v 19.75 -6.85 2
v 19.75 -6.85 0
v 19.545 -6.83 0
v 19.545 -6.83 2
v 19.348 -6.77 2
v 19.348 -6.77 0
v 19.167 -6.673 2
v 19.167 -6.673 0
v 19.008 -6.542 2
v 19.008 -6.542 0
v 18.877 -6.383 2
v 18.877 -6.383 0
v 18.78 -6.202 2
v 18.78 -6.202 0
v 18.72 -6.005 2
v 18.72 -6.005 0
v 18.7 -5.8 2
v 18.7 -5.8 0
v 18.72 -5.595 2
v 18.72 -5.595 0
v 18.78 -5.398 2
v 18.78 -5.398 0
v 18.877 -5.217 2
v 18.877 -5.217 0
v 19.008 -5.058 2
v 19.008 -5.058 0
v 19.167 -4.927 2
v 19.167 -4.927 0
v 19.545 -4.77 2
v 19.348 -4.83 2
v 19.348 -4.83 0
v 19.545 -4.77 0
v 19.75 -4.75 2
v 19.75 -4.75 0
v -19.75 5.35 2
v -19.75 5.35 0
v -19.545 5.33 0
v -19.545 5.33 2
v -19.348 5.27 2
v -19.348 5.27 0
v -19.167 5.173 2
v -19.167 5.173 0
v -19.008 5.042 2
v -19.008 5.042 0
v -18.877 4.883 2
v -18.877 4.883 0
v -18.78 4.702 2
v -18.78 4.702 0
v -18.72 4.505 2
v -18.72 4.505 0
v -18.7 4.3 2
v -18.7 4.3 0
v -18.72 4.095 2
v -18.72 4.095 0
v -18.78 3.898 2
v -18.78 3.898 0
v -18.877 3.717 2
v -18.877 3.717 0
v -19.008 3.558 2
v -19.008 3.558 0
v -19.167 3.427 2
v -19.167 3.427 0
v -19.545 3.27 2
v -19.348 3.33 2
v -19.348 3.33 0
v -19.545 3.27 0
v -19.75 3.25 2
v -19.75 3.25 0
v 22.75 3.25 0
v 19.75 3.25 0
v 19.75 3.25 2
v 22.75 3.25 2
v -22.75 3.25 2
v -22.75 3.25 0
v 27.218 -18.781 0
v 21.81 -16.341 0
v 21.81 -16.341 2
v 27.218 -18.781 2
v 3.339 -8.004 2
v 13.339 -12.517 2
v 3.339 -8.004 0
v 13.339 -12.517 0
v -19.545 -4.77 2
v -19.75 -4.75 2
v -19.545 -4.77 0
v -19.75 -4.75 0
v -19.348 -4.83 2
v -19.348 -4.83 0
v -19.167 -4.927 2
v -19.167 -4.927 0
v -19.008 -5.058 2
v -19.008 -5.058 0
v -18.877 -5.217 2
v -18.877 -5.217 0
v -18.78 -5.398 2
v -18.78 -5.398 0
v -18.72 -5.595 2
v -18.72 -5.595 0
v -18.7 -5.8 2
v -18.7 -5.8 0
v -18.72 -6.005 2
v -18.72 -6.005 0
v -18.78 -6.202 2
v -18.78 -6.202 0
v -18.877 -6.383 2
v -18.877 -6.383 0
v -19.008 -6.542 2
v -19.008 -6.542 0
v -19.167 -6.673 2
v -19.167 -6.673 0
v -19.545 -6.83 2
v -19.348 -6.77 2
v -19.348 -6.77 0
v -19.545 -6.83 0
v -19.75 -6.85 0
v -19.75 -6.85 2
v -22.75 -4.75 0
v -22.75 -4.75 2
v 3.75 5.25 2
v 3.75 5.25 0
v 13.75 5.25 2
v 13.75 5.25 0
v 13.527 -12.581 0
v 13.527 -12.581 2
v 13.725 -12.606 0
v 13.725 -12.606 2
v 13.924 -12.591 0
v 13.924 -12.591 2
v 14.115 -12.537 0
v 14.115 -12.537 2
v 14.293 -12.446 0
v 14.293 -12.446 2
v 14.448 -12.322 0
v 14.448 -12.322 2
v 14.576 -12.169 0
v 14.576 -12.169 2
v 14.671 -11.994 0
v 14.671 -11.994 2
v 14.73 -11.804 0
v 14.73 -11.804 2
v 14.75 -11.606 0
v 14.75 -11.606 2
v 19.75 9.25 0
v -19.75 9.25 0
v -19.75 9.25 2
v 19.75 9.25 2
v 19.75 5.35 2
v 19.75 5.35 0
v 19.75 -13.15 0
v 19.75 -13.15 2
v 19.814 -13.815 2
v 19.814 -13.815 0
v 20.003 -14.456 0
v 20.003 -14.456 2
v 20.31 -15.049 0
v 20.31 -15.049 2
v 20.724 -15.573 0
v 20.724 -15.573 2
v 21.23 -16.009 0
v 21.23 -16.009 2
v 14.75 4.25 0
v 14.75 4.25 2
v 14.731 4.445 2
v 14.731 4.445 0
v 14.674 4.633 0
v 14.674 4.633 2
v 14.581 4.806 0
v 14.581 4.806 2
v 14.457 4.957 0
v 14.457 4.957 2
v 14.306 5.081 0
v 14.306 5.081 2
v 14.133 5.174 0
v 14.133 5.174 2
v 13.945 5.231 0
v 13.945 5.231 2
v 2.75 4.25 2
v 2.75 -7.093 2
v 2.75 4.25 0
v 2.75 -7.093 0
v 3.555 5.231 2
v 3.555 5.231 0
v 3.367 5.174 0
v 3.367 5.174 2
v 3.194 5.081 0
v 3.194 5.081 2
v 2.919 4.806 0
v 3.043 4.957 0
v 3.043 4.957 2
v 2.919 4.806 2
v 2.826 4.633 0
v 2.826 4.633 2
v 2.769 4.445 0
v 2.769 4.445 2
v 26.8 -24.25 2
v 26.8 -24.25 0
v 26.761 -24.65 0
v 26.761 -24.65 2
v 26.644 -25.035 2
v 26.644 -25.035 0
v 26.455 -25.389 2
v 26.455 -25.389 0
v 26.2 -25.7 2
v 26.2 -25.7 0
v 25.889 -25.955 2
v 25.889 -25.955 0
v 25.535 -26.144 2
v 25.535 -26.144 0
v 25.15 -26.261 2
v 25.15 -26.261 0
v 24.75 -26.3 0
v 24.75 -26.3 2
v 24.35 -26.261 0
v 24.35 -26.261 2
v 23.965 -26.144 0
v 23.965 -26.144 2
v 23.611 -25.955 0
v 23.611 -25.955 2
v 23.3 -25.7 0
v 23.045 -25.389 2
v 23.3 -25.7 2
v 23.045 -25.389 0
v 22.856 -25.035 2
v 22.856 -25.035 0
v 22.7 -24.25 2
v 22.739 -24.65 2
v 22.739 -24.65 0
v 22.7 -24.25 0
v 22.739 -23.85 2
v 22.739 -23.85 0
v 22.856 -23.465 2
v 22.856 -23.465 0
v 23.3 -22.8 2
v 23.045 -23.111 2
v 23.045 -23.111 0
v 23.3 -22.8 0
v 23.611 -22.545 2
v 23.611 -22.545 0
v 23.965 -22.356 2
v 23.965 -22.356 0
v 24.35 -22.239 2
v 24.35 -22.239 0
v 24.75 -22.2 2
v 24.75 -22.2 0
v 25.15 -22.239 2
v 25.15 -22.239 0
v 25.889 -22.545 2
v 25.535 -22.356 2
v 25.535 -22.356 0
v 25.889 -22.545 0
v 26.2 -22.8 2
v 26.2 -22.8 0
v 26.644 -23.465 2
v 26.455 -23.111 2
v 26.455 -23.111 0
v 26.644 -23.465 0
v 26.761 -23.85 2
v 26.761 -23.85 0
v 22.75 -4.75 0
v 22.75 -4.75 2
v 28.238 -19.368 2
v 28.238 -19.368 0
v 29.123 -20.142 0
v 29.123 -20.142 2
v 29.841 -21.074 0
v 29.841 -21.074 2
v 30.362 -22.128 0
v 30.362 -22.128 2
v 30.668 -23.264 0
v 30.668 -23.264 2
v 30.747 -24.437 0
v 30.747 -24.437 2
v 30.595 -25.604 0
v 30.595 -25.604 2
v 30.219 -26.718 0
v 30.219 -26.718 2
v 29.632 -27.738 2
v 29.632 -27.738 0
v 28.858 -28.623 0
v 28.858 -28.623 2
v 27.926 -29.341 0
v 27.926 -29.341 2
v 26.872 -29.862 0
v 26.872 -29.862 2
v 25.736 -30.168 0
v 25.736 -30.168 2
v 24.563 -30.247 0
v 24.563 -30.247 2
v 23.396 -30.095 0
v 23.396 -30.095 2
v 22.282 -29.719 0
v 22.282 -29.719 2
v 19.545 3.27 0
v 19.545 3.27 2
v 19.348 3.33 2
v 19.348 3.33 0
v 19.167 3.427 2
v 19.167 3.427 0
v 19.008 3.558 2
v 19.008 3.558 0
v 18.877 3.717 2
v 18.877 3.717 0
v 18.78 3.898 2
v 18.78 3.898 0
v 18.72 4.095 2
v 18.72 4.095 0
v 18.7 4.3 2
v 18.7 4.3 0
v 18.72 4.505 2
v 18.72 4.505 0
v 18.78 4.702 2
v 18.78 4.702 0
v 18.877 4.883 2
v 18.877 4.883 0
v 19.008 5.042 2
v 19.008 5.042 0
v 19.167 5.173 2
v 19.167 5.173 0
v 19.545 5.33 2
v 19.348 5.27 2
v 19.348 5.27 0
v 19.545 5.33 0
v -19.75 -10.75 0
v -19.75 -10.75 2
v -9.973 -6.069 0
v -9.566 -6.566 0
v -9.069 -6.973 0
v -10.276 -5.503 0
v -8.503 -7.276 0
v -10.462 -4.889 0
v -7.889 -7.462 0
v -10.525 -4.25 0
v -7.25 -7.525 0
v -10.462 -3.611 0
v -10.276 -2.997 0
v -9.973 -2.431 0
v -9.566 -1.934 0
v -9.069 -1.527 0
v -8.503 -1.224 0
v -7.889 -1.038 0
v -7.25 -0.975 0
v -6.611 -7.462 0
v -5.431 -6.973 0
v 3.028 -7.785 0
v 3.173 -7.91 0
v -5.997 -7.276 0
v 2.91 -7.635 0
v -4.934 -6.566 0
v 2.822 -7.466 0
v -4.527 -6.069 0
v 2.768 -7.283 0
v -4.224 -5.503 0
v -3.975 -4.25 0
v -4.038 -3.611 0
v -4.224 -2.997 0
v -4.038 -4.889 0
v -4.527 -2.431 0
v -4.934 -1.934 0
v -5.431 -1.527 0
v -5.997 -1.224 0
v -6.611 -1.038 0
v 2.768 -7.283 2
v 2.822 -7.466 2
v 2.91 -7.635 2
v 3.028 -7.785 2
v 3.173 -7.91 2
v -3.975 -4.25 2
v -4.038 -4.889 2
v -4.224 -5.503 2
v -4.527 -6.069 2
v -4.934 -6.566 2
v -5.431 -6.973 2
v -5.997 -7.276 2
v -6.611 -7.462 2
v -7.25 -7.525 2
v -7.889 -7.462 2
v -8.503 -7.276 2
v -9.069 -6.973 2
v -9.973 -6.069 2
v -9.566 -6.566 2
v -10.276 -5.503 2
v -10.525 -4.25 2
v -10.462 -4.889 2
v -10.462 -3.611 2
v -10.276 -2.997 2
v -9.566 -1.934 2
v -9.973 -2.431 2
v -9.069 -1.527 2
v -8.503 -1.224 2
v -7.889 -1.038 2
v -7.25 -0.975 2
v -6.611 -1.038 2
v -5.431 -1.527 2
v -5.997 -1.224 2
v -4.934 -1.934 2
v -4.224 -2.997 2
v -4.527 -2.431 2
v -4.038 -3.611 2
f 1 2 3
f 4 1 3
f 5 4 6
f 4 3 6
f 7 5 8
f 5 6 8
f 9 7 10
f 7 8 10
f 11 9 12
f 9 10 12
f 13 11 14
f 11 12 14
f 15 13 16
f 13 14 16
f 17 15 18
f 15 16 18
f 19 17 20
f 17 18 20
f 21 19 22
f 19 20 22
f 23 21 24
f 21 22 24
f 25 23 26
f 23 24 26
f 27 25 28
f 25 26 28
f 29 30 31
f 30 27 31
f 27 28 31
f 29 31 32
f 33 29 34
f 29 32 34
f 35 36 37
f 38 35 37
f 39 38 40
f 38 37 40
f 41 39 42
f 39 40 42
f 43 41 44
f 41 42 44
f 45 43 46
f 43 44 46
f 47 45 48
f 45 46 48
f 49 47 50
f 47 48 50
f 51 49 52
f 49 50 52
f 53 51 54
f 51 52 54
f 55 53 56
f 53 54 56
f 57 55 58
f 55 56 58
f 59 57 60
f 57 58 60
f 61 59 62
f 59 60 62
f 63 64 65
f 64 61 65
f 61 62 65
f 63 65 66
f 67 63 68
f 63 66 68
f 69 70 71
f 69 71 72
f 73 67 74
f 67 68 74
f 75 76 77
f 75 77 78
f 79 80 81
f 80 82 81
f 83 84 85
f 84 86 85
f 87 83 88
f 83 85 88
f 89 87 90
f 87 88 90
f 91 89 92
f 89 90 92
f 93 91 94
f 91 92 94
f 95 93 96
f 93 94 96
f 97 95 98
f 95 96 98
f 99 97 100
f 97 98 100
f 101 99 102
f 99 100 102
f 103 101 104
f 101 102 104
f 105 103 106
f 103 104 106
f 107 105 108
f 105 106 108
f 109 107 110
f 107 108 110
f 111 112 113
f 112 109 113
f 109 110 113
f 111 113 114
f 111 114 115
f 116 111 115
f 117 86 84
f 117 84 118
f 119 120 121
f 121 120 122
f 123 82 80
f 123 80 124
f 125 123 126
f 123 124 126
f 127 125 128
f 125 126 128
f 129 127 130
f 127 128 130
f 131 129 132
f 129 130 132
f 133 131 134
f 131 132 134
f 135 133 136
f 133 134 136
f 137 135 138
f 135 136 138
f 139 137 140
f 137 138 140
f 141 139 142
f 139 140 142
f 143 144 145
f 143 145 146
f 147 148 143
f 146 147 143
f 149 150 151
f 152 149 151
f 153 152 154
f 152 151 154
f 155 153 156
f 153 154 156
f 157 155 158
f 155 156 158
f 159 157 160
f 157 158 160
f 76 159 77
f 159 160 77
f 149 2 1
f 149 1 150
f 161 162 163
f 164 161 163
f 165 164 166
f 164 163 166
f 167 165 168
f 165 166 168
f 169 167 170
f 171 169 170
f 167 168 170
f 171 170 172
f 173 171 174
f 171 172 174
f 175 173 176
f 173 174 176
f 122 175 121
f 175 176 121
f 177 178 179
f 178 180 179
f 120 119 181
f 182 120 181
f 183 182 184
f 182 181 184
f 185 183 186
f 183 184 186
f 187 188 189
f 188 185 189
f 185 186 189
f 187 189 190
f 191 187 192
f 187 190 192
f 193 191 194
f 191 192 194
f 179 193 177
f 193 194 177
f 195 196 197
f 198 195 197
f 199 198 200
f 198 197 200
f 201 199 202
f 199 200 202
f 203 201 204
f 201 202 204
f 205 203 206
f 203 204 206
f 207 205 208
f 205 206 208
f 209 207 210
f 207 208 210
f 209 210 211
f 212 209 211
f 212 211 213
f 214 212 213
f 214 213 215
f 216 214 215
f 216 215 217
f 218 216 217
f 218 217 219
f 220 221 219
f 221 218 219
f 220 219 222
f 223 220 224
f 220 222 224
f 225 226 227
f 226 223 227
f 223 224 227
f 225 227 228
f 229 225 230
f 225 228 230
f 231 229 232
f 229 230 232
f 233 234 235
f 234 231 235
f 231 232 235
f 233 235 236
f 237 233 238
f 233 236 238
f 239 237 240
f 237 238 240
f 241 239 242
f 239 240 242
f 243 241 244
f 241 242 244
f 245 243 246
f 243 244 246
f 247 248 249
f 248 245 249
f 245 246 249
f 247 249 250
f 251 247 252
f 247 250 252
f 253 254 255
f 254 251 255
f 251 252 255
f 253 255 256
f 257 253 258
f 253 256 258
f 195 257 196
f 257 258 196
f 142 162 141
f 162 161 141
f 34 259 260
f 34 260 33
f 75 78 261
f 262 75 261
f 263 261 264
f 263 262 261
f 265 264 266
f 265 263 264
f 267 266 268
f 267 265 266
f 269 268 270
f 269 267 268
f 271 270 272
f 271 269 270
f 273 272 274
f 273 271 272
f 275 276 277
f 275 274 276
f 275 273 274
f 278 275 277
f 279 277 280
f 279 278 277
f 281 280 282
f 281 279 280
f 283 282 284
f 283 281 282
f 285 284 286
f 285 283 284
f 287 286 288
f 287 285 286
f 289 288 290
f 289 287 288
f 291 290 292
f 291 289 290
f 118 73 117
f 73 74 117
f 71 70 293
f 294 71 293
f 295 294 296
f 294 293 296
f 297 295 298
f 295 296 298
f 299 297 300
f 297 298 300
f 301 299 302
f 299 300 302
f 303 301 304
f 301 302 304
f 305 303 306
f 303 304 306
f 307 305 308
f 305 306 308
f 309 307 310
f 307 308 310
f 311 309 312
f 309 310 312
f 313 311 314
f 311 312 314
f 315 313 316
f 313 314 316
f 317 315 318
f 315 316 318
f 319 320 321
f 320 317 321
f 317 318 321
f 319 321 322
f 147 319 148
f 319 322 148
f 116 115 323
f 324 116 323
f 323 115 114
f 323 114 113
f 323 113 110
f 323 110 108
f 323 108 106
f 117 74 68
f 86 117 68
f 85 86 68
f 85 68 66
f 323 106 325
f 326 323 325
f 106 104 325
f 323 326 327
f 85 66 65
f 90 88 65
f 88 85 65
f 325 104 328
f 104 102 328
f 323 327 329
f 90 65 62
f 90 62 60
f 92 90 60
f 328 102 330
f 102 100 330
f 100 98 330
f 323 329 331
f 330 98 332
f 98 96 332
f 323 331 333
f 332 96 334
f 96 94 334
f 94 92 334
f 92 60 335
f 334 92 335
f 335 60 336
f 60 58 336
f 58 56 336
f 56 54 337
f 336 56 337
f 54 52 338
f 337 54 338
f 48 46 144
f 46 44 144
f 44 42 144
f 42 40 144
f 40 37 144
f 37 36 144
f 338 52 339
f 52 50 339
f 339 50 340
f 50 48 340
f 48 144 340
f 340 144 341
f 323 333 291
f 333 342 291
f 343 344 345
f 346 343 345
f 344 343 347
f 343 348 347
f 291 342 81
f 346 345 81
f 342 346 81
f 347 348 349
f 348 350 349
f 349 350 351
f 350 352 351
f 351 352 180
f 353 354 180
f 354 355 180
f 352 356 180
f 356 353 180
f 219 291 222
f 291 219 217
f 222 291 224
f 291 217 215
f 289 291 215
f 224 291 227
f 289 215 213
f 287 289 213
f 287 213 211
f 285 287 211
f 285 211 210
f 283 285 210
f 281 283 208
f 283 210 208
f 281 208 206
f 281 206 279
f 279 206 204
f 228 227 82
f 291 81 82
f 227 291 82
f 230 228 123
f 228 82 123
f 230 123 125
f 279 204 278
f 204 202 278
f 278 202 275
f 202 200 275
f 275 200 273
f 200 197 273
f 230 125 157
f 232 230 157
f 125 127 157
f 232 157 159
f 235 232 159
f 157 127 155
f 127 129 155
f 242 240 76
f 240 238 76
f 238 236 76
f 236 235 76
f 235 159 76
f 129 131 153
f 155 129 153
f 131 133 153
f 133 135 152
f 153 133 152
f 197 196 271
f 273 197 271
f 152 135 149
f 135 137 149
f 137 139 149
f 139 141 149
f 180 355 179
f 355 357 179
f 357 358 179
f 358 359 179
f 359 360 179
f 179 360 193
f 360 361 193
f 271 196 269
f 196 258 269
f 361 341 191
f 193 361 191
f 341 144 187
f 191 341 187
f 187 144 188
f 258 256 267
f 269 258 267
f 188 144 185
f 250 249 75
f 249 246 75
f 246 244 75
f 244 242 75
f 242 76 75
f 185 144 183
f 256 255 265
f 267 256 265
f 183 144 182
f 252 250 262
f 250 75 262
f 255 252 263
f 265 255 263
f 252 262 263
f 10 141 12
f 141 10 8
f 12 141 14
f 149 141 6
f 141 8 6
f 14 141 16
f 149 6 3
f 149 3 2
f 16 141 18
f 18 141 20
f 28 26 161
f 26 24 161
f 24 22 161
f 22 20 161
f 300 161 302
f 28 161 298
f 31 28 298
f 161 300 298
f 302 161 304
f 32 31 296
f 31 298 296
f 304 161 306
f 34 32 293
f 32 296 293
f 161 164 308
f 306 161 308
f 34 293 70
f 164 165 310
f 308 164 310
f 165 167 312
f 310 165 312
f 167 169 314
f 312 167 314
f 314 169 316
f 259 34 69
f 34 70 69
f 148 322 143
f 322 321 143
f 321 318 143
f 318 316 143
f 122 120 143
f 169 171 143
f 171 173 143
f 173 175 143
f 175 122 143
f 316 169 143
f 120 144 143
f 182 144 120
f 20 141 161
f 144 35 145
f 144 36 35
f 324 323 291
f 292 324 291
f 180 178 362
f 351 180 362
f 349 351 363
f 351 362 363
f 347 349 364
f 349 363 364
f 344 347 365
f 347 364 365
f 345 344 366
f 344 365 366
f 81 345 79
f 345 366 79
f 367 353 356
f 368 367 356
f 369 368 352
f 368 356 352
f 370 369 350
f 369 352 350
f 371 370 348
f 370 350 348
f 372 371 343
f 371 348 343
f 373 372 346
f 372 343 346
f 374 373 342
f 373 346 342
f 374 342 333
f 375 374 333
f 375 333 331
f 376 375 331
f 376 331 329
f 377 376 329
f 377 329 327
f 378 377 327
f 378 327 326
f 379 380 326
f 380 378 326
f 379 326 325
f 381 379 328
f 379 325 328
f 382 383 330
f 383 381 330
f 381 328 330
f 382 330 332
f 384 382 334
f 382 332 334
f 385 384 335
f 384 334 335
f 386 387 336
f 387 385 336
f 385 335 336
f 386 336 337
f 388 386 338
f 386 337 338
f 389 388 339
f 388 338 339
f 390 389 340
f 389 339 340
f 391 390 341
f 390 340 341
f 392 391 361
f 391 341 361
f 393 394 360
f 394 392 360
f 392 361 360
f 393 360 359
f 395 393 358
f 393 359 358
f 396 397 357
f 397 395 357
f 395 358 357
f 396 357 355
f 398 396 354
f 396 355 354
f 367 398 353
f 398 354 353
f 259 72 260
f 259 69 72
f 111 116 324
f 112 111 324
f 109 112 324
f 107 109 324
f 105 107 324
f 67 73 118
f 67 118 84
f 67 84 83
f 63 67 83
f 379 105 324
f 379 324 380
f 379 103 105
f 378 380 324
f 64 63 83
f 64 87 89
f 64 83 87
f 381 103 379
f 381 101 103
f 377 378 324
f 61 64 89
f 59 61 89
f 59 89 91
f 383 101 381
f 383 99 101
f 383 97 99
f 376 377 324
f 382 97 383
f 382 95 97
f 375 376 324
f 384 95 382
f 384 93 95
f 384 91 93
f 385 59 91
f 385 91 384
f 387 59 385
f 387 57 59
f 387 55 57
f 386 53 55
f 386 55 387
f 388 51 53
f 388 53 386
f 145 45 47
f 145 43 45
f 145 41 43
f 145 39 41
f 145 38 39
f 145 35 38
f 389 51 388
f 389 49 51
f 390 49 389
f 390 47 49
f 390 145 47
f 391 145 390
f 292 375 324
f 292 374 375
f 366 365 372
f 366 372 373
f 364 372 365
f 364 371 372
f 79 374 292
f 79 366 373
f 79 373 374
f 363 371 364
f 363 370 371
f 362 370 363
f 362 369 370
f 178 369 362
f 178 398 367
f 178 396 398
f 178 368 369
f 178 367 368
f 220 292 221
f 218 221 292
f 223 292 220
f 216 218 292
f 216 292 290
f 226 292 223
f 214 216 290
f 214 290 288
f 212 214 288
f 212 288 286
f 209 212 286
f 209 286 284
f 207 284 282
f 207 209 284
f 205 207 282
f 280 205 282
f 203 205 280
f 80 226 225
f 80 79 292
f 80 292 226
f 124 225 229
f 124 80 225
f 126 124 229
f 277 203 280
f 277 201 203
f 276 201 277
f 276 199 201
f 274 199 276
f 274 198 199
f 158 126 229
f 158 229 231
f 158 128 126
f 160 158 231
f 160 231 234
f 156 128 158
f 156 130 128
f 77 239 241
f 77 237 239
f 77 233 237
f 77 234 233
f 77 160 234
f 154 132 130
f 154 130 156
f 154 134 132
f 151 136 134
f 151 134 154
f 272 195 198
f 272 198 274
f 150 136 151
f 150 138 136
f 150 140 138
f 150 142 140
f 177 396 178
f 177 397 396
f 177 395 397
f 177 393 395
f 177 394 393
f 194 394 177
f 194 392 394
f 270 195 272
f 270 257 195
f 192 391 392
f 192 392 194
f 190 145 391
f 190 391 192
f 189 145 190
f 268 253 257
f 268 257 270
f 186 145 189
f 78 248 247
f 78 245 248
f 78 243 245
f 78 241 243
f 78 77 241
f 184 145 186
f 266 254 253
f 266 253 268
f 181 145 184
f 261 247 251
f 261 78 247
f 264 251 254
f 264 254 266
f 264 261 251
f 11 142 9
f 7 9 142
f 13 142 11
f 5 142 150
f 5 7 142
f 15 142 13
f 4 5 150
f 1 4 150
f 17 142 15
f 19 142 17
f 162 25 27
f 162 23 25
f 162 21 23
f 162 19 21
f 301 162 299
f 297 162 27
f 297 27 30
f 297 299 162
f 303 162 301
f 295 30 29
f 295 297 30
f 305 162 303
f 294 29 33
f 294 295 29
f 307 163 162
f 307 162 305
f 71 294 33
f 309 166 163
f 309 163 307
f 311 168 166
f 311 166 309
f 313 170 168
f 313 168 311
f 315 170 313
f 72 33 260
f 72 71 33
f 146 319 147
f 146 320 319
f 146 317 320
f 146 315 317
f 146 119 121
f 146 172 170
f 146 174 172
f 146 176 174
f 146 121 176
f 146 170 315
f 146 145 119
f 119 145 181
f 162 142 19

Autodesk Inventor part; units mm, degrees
ref_plane "YZ Plane" through (0, 0, 0) normal (1, 0, 0) x (0, 1, 0)
ref_plane "XZ Plane" through (0, 0, 0) normal (0, 1, 0) x (-1, 0, 0)
ref_plane "XY Plane" through (0, 0, 0) normal (0, 0, 1) x (1, 0, 0)
sketch "スケッチ1" plane through (0, 0, 0) normal (0, 0, 1) x (1, 0, 0)
  line L0 (-19.75, 25.75) -> (19.75, 25.75) construction
  line L1 (19.75, 25.75) -> (19.75, -25.75) construction
  line L2 (19.75, -25.75) -> (-19.75, -25.75) construction
  line L3 (-19.75, -25.75) -> (-19.75, 25.75) construction
  line L4 (-19.75, 25.75) -> (19.75, -25.75) construction
  line L5 (19.75, 25.75) -> (-19.75, -25.75) construction
  circle A0 centre (24.75, -24.25) radius 2.05
  circle A1 centre (-7.25, -4.25) radius 3.275
  line L6 (0, 25.75) -> (0, -25.75) construction
  line L7 (-19.75, 3.25) -> (-22.75, 3.25)
  line L8 (-22.75, 3.25) -> (-22.75, -4.75)
  arc A2 (-19.75, 3.25) -> (-19.75, 5.35) centre (-19.75, 4.3) ccw
  line L9 (-22.75, -0.75) -> (-19.75, -0.75) construction
  line L10 (-19.75, -4.75) -> (-22.75, -4.75)
  arc A3 (-19.75, -6.85) -> (-19.75, -4.75) centre (-19.75, -5.8) ccw
  line L11 (-19.75, 5.35) -> (-19.75, 9.25)
  line L12 (-19.75, 9.25) -> (19.75, 9.25)
  arc A4 (19.75, 5.35) -> (19.75, 3.25) centre (19.75, 4.3) ccw
  arc A5 (19.75, -4.75) -> (19.75, -6.85) centre (19.75, -5.8) ccw
  line L13 (19.75, 5.35) -> (19.75, 9.25)
  arc A6 (22.2819, -29.7189) -> (27.2181, -18.7811) centre (24.75, -24.25) ccw
  line L14 (-19.75, -6.85) -> (-19.75, -10.75)
  line L15 (-19.75, -10.75) -> (22.2819, -29.7189)
  line L16 (19.75, -6.85) -> (19.75, -15.4108)
  line L17 (19.75, -15.4108) -> (27.2181, -18.7811)
  circle A7 centre (-7.25, -4.25) radius 6 construction
  circle A8 centre (24.75, -24.25) radius 6 construction
  line L18 (2.75, 5.25) -> (14.75, 5.25)
  line L19 (14.75, 5.25) -> (14.75, -13.1543)
  line L20 (14.75, -13.1543) -> (2.75, -7.7388)
  line L21 (2.75, -7.7388) -> (2.75, 5.25)
  line L22 (19.75, 3.25) -> (22.75, 3.25)
  line L23 (22.75, 3.25) -> (22.75, -4.75)
  line L24 (22.75, -4.75) -> (19.75, -4.75)
  point P0 (0, 0)
  dimension "d0" = 39.5
  dimension "d1" = 51.5
  dimension "d2" = 4.1
  dimension "d3" = 6.55
  dimension "d4" = 32
  dimension "d5" = 20
  dimension "d6" = 3
  dimension "d7" = 1.05
  dimension "d8" = 8
  dimension "d9" = 26.5
  dimension "d11" = 30
  dimension "d12" = 12.5
  dimension "d13" = 6
  dimension "d14" = 12
  dimension "d19" = 12
  dimension "d21" = 4
  dimension "d22" = 5
  dimension "d24" = 4
  dimension "d26" = 3
extrude "押し出し1" add sketch "スケッチ1" along normal blind 2
fillet "フィレット1" radius 3.5 1 edges at (19.75, -15.4108, 1)
fillet "フィレット2" radius 1 4 edges at (2.75, 5.25, 1) (14.75, 5.25, 1) (2.75, -7.7388, 1) (14.75, -13.1543, 1)
equation "\"d24\" = d21"
properties part number "Leg_joint_pitch_frame" material "アルミニウム 2014-T4"
